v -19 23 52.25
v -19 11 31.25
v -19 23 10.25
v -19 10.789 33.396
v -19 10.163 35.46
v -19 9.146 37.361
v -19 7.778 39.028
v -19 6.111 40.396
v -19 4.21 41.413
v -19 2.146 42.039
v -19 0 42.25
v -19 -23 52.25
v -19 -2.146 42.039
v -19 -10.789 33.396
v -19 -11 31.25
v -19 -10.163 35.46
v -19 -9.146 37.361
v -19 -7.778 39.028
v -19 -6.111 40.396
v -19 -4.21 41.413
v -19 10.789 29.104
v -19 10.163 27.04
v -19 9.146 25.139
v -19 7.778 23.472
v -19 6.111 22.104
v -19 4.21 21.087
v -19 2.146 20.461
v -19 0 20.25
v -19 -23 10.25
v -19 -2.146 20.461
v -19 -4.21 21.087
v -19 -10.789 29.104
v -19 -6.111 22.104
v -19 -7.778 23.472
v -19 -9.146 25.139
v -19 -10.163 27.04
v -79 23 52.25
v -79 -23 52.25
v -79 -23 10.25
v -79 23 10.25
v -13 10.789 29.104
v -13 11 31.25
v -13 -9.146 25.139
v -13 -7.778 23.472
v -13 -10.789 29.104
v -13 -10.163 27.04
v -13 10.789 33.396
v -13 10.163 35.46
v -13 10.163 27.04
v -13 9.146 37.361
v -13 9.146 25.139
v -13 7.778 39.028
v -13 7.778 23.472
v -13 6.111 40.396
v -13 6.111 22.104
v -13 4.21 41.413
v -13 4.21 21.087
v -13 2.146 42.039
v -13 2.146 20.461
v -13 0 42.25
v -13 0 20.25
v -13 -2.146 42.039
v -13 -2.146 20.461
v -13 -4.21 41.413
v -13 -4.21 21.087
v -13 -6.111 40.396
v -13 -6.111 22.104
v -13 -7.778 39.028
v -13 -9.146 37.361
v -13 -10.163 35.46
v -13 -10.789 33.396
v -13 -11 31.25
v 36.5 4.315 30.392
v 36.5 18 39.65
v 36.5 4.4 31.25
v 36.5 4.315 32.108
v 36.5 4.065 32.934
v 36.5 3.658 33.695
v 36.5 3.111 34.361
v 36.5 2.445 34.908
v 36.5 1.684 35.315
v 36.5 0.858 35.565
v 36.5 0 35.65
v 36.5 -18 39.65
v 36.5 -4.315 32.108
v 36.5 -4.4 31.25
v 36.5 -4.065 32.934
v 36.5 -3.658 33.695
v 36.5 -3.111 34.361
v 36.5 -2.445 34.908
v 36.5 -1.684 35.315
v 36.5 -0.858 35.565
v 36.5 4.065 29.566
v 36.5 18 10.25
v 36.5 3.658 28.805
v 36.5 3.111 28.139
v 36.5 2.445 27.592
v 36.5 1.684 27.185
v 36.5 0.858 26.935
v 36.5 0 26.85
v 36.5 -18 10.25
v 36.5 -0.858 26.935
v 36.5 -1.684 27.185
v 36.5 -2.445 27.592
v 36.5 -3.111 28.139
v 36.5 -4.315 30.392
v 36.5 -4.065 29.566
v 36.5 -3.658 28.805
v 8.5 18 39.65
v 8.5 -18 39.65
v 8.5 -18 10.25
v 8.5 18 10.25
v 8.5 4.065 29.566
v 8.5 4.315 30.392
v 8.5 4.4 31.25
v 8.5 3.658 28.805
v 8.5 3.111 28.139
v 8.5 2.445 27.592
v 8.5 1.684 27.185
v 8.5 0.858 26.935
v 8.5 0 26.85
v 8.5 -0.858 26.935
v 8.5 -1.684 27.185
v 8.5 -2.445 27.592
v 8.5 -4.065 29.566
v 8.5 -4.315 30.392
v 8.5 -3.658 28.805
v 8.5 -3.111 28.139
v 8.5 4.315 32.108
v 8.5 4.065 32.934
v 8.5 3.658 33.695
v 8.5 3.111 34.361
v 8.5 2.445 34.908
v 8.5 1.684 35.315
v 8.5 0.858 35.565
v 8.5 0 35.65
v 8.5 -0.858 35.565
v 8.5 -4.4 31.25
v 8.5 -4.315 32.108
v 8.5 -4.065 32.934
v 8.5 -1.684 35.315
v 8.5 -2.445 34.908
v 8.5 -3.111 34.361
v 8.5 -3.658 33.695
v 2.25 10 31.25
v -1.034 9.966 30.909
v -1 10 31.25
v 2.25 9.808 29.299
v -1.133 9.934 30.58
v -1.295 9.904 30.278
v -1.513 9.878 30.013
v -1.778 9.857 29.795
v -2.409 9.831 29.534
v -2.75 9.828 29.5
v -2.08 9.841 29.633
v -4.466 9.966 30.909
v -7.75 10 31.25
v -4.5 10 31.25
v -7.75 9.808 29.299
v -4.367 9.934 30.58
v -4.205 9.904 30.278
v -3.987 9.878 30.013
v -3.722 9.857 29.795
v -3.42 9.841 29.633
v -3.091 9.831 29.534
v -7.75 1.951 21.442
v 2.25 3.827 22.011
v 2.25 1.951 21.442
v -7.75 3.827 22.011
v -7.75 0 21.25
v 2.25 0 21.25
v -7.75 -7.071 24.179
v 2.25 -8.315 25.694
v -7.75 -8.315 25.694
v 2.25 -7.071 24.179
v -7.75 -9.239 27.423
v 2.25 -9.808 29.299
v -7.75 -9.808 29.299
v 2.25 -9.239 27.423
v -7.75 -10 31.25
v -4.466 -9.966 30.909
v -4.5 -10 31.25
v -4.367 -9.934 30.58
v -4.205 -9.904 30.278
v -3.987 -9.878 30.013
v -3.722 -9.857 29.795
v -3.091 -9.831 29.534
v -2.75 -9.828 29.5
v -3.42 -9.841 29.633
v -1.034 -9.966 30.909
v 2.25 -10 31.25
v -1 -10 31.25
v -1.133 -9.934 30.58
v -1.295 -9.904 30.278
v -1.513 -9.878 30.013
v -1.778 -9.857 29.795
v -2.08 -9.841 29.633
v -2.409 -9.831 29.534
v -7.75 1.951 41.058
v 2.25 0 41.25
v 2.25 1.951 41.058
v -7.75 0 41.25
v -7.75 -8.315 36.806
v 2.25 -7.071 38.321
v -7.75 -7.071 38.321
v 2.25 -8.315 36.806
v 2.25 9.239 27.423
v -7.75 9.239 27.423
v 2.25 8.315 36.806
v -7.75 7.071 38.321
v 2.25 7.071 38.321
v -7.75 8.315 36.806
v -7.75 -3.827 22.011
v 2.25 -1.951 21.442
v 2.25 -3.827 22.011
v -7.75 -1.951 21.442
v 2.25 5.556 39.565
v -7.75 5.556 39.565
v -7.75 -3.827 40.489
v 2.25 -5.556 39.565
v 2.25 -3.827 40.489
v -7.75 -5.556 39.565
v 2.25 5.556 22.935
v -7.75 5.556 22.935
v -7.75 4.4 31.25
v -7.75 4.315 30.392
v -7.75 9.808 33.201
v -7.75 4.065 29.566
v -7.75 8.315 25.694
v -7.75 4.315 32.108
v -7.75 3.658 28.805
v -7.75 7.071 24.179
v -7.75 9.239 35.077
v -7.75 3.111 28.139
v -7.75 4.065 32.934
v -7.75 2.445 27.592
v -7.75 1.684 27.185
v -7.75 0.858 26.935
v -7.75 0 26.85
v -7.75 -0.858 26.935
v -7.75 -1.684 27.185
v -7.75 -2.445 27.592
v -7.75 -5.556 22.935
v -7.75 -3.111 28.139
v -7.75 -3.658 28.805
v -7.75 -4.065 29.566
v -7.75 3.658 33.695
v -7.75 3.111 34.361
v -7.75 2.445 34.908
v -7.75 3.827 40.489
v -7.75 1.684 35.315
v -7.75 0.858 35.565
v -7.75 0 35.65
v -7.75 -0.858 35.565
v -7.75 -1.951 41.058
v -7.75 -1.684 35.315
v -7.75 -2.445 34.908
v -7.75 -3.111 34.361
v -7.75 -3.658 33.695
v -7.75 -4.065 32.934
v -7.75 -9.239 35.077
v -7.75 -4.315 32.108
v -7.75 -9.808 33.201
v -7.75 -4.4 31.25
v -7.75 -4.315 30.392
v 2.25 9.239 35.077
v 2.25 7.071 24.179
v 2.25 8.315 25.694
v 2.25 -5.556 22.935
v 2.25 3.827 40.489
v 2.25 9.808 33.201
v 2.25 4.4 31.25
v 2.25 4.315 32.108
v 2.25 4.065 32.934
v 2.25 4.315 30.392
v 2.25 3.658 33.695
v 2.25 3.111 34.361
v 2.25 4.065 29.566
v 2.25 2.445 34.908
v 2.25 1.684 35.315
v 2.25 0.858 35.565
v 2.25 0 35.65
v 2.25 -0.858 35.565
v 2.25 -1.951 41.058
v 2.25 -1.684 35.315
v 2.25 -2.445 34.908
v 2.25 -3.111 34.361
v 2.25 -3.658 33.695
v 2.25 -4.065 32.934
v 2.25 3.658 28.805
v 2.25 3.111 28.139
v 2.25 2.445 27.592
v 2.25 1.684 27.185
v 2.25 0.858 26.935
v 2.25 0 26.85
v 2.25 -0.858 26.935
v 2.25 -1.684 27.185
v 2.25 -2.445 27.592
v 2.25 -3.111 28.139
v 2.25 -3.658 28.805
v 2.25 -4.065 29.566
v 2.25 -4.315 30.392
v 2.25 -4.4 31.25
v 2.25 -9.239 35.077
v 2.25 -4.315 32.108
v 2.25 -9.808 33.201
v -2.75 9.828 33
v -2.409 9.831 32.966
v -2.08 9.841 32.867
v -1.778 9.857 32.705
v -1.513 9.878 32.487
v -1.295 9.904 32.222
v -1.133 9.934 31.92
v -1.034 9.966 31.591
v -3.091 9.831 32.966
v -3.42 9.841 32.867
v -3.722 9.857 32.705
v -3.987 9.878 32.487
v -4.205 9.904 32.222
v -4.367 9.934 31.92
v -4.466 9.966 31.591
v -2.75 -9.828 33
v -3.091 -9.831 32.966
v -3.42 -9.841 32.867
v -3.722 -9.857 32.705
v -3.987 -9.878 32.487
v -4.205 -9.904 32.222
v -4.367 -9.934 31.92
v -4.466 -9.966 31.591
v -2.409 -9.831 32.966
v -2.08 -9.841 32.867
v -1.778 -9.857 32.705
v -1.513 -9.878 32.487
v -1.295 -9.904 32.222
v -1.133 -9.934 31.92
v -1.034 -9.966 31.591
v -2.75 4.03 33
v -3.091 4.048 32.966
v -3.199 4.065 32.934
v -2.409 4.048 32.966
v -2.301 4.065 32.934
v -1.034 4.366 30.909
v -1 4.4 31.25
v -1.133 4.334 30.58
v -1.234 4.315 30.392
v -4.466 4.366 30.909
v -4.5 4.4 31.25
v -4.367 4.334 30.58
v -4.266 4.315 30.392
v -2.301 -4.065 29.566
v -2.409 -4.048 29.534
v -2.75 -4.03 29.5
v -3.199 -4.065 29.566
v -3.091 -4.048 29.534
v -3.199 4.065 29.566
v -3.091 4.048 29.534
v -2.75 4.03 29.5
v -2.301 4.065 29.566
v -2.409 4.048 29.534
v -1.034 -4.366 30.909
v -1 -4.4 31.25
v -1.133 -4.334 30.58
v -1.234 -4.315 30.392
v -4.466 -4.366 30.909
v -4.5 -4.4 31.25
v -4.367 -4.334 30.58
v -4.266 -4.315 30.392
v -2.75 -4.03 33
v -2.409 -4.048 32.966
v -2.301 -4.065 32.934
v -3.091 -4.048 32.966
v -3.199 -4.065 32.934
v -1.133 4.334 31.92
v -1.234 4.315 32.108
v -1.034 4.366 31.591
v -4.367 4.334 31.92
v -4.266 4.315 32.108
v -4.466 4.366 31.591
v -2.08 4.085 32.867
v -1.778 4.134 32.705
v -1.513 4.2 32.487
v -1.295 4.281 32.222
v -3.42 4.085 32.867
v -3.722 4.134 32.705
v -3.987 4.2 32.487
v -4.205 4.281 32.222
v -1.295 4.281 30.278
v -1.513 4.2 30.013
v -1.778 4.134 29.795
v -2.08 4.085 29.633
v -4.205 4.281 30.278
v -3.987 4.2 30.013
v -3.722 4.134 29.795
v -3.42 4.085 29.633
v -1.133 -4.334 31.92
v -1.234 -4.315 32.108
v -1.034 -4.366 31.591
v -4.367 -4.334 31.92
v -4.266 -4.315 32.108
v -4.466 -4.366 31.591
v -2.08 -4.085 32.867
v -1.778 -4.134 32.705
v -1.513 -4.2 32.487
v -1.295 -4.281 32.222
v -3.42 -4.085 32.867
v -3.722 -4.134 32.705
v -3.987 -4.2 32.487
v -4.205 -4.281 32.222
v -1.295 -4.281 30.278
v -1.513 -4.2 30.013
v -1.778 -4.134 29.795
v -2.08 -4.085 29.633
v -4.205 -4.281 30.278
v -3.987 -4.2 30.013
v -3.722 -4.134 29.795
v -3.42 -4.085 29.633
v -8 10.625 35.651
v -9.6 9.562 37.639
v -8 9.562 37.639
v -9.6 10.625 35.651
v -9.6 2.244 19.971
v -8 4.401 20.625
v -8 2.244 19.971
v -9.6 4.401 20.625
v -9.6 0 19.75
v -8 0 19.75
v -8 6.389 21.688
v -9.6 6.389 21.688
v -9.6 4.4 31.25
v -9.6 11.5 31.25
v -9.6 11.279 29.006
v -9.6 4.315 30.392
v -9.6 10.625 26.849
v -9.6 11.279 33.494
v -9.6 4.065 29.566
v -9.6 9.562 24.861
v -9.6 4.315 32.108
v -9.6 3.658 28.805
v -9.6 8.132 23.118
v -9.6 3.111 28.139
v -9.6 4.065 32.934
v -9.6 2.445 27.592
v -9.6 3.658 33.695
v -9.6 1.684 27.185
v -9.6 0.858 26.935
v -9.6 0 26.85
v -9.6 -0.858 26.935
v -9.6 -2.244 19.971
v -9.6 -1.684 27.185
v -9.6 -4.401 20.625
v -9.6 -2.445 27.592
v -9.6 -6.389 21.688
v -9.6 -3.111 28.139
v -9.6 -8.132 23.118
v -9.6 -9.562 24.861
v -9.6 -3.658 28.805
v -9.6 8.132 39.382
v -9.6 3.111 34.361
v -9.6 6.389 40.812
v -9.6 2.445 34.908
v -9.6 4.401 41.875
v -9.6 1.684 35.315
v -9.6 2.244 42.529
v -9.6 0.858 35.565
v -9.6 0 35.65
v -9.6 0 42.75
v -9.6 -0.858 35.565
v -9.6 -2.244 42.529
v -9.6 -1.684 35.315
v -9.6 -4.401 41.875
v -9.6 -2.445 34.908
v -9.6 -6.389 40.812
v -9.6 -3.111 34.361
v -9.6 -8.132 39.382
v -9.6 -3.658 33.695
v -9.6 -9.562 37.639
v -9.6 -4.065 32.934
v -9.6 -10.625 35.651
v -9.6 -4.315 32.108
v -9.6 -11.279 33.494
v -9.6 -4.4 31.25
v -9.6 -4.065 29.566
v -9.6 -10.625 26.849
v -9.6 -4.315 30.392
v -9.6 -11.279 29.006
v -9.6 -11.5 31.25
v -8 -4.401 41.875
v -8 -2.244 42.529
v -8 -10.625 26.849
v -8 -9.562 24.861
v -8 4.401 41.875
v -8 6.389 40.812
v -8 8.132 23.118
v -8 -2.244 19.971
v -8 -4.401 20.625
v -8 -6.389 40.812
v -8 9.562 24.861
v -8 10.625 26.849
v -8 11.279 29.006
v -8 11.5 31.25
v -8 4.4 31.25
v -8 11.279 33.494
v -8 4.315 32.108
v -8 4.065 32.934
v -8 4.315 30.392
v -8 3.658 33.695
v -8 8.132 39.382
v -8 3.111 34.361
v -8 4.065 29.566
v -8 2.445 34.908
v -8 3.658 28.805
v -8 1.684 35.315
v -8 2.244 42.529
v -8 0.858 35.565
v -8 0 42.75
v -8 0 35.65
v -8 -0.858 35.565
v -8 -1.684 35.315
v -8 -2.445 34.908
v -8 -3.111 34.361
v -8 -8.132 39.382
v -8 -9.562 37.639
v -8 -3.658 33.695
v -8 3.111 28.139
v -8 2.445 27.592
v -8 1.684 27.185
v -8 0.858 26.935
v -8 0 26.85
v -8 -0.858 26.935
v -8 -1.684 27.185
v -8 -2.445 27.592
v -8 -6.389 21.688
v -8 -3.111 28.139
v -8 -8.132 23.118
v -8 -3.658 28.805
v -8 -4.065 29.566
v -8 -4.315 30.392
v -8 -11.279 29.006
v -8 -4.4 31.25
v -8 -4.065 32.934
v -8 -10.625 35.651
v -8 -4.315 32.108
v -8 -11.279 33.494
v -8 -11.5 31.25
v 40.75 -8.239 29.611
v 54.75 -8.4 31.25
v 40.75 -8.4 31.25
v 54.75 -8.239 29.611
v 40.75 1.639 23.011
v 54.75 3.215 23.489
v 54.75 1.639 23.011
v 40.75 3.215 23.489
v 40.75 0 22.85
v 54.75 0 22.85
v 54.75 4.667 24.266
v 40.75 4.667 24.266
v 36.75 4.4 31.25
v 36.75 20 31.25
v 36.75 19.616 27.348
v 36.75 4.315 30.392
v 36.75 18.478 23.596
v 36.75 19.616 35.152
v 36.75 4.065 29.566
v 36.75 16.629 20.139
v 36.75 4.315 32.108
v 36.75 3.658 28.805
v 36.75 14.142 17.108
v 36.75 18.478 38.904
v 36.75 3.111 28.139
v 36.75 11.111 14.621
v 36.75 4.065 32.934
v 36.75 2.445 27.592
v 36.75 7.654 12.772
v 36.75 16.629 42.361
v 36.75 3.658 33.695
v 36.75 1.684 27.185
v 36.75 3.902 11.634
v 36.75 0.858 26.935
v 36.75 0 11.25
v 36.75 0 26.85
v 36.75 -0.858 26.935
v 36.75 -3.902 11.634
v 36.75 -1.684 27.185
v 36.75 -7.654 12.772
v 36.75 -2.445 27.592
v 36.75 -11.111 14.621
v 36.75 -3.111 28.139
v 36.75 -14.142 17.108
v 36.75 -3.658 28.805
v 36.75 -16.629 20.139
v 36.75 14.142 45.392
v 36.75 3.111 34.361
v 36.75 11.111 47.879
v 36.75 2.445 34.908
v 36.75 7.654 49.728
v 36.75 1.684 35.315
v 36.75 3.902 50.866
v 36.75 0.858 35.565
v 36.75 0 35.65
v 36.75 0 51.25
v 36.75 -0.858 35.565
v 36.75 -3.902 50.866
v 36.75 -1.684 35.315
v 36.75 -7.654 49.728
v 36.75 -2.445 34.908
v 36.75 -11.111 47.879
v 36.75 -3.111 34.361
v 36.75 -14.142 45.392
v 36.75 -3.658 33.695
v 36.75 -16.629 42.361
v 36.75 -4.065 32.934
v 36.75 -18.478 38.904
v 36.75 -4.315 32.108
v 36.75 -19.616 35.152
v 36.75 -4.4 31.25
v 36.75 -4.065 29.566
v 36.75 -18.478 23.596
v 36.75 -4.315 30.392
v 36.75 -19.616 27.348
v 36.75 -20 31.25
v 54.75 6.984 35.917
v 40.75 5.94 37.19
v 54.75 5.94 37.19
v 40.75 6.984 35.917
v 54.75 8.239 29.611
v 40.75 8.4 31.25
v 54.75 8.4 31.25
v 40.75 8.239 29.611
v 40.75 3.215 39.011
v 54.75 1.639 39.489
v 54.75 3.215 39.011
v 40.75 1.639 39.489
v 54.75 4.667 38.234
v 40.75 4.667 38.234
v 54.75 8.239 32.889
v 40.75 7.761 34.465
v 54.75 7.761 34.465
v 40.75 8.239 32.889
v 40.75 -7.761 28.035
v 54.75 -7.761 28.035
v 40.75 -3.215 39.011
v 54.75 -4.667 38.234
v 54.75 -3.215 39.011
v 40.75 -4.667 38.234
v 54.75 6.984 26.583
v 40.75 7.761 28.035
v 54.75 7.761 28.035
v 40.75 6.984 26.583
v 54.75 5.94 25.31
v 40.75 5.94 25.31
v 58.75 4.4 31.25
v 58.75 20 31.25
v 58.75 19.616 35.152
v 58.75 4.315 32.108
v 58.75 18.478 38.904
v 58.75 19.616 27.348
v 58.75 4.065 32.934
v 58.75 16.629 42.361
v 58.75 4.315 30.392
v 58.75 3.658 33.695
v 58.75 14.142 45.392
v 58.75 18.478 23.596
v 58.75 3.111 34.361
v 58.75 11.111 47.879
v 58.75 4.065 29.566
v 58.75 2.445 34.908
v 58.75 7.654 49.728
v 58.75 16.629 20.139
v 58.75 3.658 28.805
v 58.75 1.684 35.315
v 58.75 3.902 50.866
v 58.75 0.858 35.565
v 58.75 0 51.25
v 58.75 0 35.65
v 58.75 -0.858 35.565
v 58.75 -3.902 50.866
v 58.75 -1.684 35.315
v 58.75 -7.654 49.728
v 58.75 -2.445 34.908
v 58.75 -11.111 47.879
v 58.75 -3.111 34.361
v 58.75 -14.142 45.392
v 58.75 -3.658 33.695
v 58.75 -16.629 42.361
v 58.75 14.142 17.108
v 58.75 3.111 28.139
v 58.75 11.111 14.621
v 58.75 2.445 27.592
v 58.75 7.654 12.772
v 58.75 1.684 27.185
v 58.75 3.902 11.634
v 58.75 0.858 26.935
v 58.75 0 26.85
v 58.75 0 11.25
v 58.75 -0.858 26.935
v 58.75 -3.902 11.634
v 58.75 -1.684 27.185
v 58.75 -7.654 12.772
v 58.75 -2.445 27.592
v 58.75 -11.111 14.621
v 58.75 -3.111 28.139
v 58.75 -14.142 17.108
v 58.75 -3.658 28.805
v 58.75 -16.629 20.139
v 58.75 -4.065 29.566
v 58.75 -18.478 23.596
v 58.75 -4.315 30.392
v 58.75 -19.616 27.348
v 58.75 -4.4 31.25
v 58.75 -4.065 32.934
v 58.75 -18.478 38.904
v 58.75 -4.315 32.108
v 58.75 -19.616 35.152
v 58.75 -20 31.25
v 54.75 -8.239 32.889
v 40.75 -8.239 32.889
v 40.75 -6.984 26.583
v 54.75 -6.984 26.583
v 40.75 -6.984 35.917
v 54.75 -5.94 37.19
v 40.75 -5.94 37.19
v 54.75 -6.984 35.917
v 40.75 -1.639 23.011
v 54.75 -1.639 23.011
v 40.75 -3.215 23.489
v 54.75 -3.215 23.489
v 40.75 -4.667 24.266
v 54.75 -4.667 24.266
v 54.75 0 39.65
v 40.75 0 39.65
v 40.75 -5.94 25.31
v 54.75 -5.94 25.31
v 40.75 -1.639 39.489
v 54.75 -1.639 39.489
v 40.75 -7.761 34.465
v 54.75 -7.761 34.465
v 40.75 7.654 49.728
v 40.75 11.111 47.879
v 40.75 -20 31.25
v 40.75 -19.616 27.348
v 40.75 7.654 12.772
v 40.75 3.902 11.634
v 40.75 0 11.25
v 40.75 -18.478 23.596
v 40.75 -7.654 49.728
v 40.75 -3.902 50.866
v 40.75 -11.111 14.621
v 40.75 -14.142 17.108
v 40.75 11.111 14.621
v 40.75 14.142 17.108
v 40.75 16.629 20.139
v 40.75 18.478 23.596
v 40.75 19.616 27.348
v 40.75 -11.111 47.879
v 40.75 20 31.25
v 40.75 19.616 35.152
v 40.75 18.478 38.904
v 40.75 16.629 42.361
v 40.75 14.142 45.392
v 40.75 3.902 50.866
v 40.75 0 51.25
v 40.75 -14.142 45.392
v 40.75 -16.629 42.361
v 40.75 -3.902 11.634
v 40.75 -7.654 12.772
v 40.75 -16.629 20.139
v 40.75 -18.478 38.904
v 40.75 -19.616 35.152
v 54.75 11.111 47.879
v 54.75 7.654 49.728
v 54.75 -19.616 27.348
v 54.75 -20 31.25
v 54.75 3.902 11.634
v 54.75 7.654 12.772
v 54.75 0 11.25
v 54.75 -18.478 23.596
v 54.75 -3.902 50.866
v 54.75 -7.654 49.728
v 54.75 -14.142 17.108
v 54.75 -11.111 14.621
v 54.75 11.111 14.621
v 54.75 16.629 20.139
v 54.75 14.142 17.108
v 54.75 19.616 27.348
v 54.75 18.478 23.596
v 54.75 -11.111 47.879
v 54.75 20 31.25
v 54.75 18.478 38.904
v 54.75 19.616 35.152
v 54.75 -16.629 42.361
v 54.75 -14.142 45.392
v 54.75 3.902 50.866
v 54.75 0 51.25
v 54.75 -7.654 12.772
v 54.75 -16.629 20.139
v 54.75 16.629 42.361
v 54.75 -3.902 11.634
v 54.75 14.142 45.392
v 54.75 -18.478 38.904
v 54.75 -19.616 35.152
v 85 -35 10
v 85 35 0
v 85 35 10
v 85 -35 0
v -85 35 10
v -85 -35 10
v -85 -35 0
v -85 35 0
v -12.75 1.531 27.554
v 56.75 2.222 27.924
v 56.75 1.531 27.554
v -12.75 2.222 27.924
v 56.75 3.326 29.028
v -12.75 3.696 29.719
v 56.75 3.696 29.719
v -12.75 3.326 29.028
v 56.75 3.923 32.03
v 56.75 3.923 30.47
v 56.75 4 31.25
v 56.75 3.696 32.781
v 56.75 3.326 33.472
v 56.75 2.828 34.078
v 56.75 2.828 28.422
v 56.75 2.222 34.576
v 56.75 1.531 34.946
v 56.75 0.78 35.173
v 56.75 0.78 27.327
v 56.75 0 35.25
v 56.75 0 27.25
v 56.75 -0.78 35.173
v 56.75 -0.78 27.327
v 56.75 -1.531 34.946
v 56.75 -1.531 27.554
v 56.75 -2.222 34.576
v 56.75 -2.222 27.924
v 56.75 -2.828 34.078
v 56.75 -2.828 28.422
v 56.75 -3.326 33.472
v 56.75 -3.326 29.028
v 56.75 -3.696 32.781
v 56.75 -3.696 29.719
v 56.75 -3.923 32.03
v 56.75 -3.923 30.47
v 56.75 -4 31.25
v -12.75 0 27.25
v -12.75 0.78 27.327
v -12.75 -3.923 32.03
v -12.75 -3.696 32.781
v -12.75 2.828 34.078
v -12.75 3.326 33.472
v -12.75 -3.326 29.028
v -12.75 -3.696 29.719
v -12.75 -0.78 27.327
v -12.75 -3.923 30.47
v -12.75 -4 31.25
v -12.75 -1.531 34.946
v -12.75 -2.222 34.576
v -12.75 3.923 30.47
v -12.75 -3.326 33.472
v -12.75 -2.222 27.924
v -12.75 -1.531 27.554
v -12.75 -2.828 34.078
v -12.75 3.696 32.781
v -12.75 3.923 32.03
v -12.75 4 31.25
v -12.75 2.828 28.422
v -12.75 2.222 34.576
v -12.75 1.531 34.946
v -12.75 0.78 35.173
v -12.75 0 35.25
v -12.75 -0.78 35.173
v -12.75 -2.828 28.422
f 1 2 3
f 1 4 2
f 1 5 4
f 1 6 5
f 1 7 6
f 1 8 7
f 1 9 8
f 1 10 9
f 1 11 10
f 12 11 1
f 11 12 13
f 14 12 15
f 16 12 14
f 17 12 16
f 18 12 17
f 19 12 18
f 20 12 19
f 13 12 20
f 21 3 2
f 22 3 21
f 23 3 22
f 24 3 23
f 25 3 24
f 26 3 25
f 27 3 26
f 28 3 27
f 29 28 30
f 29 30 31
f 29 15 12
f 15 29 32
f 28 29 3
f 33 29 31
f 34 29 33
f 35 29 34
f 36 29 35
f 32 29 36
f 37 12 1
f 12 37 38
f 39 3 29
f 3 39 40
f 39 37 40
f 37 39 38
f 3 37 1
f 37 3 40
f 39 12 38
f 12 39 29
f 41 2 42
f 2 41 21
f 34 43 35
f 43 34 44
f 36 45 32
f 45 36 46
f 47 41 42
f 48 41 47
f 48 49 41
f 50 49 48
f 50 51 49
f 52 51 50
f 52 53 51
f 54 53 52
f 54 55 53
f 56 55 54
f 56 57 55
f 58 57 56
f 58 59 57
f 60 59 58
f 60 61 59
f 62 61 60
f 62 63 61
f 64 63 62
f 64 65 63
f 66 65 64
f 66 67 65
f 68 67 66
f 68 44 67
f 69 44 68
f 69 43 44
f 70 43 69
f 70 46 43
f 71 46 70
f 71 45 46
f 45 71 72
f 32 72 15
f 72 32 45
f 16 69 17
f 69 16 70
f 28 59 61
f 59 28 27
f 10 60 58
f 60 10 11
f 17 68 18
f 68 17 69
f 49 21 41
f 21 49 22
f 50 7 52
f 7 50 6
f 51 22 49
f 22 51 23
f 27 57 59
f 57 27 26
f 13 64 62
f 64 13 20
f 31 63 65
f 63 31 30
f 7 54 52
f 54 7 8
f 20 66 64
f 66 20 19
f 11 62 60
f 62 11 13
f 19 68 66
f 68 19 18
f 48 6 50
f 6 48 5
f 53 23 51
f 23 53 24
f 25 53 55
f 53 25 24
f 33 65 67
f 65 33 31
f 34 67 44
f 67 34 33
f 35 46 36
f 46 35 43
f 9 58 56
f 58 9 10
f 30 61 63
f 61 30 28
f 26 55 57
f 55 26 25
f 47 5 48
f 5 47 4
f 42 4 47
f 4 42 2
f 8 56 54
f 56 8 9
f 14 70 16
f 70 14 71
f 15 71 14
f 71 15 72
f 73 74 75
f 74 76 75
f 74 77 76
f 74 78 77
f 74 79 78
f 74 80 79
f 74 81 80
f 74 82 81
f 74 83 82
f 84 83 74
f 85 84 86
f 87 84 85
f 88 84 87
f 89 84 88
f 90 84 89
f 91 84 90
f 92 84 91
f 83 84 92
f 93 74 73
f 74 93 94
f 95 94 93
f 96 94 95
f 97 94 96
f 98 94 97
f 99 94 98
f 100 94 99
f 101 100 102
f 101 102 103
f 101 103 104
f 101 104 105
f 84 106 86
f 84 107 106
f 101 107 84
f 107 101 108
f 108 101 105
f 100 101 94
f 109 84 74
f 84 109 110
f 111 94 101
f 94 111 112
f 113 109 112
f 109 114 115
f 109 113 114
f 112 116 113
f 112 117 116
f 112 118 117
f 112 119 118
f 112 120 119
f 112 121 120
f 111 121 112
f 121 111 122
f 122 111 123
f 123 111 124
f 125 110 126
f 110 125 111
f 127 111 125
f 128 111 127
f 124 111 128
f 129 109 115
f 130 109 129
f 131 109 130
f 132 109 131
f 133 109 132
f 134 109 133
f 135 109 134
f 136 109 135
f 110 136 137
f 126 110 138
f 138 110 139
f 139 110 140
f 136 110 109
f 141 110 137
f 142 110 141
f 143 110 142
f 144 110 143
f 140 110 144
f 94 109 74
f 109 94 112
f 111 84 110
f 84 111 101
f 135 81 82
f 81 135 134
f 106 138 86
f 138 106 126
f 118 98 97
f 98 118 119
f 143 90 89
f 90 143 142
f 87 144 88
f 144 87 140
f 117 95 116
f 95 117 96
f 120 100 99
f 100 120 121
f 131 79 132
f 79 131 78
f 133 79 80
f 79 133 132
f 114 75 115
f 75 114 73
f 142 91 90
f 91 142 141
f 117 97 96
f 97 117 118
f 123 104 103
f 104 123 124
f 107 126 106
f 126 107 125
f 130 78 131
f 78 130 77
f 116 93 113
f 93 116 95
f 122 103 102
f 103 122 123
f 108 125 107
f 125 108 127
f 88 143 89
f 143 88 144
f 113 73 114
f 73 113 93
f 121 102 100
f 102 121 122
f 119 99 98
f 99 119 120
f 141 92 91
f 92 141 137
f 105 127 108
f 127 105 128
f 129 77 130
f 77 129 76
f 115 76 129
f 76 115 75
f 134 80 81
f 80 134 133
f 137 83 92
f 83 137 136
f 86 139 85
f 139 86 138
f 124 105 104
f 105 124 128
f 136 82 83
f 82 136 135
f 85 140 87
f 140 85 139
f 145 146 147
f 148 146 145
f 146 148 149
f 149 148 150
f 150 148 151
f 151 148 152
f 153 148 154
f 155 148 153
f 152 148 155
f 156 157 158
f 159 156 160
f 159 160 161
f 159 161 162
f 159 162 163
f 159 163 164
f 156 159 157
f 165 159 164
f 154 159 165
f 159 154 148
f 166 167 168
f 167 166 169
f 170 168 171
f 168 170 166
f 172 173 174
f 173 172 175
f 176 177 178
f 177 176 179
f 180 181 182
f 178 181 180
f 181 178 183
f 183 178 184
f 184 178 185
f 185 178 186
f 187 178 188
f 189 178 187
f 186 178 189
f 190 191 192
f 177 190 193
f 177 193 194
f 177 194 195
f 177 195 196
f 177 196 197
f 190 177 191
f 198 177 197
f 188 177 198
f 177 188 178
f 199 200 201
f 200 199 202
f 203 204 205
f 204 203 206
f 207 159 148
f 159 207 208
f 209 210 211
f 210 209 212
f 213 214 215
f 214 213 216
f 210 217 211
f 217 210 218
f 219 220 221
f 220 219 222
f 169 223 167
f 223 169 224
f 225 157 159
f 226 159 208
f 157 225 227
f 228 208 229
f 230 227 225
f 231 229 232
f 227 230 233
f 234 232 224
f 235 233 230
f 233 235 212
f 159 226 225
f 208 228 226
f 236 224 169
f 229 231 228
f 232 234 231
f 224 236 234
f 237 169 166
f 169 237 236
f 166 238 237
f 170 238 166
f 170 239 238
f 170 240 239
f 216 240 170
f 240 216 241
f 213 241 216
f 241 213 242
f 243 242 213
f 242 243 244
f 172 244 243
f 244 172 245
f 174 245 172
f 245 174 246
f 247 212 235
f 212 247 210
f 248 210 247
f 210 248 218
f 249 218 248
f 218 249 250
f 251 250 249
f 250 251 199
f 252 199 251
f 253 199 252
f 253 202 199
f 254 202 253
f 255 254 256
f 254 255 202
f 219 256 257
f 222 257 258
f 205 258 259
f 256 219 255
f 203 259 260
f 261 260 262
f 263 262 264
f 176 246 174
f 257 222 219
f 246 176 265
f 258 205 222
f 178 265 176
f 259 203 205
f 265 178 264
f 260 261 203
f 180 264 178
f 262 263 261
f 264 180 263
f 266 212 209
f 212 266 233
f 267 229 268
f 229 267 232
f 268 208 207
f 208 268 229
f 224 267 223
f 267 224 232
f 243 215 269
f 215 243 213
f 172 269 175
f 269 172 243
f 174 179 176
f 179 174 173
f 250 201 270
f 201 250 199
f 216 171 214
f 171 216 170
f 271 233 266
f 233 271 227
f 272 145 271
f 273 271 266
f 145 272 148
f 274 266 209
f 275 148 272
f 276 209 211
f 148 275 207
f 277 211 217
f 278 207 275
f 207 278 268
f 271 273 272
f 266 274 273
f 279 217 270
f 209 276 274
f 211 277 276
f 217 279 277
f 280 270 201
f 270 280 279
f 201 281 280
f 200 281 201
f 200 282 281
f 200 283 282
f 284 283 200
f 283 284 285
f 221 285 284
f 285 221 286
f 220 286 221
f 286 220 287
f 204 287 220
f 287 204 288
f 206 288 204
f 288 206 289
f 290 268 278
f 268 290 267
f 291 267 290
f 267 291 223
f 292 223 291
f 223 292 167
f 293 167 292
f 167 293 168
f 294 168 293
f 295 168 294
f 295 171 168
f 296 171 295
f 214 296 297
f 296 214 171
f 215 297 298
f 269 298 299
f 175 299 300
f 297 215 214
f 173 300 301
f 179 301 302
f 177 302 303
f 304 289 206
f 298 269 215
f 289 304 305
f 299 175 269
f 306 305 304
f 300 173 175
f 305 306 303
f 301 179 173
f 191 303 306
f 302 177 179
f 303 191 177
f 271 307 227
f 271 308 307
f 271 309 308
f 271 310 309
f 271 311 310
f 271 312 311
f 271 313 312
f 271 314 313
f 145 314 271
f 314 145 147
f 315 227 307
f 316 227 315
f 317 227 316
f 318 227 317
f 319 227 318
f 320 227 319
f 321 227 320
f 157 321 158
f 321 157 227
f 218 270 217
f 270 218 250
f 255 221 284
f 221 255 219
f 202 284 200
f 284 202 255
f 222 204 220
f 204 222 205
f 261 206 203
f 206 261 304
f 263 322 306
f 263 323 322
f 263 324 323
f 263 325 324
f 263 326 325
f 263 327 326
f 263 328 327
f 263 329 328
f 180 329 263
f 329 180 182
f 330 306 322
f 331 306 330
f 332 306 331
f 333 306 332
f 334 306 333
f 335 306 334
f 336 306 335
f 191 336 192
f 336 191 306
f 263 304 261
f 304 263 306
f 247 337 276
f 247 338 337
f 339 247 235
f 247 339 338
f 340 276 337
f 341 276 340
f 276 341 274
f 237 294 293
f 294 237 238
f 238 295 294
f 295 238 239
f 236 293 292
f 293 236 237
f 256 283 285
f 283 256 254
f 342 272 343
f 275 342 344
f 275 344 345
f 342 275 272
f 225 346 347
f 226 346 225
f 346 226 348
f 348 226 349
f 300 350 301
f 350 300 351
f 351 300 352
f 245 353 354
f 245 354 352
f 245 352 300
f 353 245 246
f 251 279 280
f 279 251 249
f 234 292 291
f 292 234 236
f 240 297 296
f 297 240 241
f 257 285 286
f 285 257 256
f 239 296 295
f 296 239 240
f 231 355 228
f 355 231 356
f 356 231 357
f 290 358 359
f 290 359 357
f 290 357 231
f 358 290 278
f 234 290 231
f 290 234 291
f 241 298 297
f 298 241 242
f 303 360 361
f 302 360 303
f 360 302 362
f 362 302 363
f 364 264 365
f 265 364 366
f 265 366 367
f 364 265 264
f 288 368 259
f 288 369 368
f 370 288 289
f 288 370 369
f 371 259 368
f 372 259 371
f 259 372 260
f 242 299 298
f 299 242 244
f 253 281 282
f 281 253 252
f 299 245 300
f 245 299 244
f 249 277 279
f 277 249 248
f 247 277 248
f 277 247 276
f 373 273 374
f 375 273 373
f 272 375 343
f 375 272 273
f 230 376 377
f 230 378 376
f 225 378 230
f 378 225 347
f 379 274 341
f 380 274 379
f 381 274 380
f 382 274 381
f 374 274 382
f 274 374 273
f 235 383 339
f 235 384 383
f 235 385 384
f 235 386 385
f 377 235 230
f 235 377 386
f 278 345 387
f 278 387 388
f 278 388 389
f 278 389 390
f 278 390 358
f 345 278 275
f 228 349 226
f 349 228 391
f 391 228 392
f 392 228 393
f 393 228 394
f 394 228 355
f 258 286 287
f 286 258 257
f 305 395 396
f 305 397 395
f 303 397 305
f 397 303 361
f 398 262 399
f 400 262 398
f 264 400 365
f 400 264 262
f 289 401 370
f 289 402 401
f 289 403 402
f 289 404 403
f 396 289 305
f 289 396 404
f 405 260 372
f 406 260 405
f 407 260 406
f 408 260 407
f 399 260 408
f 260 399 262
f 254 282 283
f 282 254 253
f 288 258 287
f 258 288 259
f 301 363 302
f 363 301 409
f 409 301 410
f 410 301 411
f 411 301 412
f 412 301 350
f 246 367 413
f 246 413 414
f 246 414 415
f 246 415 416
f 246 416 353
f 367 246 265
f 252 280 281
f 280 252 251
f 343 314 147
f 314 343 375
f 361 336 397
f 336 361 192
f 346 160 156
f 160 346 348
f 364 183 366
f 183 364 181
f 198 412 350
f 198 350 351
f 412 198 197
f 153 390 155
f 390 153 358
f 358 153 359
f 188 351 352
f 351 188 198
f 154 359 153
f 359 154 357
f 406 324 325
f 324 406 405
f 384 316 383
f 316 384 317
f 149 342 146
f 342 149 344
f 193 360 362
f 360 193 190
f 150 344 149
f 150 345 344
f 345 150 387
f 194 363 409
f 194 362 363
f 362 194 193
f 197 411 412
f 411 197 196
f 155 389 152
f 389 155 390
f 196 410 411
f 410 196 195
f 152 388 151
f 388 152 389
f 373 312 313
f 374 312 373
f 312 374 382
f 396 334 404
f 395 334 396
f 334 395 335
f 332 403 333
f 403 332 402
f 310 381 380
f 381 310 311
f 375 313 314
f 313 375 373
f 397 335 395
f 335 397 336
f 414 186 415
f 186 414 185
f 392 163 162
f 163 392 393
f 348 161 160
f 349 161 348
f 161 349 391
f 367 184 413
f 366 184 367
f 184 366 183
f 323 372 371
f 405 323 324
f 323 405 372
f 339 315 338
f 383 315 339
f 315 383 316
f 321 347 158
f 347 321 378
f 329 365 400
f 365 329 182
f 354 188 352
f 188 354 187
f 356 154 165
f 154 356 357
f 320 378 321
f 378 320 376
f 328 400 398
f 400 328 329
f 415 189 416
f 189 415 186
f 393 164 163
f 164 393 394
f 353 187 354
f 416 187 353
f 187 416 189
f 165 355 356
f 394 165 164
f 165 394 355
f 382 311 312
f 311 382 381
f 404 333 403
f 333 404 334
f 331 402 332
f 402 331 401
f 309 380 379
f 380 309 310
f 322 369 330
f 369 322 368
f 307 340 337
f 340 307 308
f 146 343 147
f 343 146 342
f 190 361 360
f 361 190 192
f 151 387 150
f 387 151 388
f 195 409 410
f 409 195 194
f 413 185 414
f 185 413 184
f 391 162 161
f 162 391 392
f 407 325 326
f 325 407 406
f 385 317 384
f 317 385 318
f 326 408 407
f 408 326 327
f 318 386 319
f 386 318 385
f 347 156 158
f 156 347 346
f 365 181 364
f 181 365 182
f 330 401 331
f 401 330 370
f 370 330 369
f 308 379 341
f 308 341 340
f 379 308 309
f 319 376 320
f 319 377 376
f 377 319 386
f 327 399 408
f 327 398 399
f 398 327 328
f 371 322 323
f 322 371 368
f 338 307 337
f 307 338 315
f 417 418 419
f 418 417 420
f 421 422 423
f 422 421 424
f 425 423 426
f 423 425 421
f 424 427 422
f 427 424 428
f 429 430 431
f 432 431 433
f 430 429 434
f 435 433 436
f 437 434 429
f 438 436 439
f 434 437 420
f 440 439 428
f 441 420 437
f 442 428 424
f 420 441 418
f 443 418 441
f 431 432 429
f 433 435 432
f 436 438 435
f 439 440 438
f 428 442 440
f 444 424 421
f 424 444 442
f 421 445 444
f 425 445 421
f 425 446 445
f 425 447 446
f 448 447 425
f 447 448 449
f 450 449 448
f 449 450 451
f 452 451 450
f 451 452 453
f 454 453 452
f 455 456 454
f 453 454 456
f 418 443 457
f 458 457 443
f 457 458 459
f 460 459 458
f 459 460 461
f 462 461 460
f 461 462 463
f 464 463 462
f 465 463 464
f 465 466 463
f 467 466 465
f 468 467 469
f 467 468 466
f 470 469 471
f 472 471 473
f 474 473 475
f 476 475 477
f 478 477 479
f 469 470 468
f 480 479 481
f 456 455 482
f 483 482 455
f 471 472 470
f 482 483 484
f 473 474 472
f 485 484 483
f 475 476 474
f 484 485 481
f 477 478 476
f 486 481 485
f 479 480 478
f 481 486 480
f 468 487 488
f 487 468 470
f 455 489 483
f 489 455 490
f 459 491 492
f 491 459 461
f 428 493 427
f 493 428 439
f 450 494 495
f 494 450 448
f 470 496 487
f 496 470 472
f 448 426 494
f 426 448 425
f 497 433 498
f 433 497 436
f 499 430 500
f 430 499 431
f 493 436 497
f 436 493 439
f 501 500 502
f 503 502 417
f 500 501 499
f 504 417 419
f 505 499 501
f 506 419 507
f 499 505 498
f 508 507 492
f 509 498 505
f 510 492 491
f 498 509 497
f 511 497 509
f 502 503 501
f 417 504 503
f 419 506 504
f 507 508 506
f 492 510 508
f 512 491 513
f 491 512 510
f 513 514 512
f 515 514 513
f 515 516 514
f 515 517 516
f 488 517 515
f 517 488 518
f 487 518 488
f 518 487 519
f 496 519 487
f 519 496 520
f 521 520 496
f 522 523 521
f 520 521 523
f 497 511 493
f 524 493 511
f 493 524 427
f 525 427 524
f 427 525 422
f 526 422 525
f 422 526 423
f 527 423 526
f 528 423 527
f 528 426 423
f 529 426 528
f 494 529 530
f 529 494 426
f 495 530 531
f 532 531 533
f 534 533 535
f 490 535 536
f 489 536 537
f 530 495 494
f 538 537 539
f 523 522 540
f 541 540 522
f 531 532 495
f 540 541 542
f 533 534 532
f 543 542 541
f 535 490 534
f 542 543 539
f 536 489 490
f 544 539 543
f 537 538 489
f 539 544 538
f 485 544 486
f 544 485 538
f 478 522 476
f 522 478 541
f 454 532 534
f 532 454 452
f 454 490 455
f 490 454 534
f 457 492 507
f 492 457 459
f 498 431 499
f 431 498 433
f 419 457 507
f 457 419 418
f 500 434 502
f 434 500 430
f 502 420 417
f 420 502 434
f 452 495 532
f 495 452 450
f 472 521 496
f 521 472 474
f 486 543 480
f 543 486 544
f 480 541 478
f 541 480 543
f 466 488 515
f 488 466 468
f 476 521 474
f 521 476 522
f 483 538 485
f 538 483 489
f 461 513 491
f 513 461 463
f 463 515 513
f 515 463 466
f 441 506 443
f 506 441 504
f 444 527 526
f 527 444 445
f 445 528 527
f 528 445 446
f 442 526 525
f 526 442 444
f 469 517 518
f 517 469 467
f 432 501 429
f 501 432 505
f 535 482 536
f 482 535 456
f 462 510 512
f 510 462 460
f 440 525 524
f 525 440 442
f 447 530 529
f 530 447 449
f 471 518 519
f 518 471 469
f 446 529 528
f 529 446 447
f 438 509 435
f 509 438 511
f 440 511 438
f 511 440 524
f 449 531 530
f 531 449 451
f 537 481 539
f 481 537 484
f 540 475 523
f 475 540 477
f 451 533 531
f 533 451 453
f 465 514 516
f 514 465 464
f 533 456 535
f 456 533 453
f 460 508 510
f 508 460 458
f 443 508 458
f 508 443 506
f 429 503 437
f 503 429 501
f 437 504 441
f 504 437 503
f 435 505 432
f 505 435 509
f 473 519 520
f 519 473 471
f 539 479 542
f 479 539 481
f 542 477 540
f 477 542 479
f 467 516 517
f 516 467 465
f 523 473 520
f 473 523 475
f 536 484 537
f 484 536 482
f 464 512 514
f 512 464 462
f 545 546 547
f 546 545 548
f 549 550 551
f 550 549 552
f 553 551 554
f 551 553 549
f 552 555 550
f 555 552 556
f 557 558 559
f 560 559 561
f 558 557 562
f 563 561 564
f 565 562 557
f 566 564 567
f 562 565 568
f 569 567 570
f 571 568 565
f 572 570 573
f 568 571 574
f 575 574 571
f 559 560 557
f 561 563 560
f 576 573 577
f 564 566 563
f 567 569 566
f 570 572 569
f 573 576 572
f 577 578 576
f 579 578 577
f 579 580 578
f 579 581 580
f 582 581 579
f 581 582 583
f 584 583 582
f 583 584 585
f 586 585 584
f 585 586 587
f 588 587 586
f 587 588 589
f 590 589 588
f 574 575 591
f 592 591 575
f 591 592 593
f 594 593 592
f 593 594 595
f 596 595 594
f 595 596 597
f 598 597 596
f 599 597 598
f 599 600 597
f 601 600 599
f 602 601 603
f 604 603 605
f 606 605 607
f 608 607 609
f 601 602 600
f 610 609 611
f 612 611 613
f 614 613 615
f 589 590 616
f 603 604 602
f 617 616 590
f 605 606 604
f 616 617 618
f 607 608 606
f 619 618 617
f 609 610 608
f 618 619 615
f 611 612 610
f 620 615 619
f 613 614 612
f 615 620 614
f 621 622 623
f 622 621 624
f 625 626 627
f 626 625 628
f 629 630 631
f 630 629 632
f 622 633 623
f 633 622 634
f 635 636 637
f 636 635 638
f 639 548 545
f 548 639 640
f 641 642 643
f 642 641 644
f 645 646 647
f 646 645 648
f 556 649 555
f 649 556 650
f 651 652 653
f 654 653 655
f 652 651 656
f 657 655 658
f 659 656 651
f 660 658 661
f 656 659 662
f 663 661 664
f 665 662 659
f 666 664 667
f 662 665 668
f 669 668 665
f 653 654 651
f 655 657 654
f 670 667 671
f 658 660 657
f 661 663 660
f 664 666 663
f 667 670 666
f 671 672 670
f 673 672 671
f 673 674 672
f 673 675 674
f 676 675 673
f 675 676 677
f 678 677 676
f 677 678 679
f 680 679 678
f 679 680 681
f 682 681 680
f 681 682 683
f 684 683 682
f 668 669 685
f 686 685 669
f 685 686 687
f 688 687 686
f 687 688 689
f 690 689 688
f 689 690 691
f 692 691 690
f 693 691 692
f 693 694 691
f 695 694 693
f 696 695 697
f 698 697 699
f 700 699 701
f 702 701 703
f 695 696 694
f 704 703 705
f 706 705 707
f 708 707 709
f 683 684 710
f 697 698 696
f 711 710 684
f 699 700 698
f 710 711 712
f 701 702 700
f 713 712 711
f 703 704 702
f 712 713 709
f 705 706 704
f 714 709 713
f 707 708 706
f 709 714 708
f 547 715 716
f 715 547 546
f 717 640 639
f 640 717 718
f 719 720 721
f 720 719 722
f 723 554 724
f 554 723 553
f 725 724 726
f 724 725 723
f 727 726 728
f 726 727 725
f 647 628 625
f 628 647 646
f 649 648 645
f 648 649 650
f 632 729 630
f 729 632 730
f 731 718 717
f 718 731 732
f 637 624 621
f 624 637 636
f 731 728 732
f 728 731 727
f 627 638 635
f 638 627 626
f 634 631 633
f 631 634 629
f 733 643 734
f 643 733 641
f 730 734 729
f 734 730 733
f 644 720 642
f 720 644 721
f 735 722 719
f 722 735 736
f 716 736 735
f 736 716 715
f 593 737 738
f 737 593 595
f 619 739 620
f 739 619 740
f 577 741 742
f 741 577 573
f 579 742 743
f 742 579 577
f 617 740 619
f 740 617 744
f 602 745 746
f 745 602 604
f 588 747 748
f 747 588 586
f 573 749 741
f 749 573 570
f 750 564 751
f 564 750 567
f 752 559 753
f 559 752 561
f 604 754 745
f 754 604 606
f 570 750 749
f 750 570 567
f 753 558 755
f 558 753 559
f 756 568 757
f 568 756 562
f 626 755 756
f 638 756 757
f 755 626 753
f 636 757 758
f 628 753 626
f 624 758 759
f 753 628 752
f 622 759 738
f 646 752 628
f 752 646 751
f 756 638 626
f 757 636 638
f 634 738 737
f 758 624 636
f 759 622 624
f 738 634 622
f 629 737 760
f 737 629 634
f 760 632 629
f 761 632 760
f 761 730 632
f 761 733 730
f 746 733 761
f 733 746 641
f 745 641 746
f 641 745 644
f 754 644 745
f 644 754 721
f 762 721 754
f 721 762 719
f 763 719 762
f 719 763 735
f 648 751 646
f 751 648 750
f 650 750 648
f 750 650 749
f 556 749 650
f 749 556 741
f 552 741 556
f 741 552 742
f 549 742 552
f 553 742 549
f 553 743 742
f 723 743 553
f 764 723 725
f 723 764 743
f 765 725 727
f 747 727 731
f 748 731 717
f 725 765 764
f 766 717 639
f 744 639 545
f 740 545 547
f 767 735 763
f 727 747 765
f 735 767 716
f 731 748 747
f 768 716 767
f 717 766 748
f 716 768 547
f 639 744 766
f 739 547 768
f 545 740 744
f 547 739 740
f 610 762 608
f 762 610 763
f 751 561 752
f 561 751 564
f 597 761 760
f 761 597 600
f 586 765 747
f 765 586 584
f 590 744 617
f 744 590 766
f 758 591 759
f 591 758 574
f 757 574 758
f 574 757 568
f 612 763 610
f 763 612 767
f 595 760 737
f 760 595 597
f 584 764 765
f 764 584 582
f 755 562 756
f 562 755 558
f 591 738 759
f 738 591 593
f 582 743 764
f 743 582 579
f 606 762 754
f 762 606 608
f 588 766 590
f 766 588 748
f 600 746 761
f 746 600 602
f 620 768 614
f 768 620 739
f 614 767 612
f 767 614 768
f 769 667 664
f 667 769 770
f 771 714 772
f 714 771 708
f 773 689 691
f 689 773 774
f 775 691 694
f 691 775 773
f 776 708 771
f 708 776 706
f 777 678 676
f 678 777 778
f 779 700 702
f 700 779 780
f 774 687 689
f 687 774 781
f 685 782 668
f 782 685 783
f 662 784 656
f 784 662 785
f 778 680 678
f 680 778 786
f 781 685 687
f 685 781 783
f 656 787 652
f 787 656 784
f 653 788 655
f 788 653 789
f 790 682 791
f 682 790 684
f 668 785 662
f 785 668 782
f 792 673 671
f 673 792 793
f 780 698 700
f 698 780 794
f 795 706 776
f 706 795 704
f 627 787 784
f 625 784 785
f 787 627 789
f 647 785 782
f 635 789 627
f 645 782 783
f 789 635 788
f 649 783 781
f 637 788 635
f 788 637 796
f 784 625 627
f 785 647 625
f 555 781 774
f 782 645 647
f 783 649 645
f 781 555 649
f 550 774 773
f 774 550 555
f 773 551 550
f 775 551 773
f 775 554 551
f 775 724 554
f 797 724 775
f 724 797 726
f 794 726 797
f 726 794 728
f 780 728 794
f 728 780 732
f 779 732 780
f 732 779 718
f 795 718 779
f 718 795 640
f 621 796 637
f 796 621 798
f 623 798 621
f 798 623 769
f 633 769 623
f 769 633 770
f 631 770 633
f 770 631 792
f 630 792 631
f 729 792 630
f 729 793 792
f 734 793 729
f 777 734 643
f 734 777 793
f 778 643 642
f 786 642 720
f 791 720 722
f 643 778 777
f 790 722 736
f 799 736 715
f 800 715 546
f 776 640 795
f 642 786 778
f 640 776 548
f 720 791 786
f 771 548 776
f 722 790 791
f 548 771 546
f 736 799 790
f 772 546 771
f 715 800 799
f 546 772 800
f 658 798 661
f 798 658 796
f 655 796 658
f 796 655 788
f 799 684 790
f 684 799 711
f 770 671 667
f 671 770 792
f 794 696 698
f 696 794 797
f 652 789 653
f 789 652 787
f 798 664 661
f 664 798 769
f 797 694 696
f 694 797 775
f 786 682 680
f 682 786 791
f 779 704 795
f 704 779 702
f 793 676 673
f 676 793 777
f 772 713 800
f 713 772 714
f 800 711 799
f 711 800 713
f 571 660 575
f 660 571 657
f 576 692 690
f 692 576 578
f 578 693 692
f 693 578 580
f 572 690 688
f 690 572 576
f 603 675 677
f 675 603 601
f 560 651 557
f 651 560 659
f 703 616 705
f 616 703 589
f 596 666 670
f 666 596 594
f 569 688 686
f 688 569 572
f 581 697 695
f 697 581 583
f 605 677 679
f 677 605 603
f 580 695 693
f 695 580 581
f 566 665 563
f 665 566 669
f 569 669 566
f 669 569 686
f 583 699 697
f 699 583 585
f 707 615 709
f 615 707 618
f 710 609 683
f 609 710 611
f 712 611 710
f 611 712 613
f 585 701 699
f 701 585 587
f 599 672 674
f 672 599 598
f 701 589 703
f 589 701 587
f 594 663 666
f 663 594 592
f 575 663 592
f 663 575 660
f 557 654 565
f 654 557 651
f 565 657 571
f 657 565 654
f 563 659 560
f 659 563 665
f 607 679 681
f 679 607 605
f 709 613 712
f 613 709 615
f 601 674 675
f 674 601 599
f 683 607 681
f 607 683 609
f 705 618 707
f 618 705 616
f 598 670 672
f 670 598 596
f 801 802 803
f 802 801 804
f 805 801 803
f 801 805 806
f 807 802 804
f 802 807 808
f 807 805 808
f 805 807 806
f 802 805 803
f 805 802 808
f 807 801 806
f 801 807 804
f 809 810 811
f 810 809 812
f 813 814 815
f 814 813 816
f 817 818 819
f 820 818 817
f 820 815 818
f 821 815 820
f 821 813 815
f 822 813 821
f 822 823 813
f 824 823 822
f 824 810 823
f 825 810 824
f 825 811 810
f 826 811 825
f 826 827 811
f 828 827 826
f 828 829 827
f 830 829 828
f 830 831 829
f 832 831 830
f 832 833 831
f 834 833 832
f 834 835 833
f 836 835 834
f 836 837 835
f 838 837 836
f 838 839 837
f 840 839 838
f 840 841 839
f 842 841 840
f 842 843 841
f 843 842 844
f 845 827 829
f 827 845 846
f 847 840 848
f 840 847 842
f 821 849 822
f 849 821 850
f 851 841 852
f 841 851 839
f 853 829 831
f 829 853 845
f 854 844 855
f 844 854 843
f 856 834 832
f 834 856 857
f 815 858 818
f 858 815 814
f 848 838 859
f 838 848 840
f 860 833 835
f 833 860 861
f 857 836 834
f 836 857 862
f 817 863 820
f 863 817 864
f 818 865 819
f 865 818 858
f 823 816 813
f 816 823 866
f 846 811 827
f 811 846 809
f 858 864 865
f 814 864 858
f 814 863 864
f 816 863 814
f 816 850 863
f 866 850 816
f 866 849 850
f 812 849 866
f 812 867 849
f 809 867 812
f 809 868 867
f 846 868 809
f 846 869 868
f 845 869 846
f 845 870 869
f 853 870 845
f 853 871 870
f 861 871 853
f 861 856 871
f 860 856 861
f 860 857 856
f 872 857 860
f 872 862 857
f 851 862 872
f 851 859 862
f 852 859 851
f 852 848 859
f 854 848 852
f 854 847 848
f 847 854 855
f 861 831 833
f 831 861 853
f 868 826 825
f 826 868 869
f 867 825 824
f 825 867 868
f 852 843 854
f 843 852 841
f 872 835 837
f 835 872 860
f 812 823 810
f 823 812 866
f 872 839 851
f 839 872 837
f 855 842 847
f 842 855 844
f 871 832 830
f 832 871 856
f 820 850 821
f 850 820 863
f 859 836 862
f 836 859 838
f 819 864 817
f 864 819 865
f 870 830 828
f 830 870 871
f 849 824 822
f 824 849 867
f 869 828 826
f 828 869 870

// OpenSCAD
$fn = 32;

// ------------------------------------------------------------------------
// Motor drive station: motor 60 x 42 mm, shaft d8, pulley d40
// Every part is its own module, assembly() places every instance.
// ------------------------------------------------------------------------

// --- part 1 ---
module station_bed() {
  difference() {
    translate([-85, -35, 0]) cube([170, 70, 10]);
  }
}

// --- part 2 ---
module drive_motor() {
  union() {
    translate([-30, -23, 0]) cube([60, 46, 42]);
    translate([33, 0, 21]) rotate([0, 90, 0]) cylinder(h = 6, d = 22, center = true);
  }
}

// --- part 3 ---
module pillow_block() {
  difference() {
    translate([-14, -18, 0]) cube([28, 36, 29.4]);
    translate([0, 0, 21]) rotate([0, 90, 0]) cylinder(h = 30, d = 8.8, center = true);
  }
}

// --- part 4 ---
module drive_shaft() {
  translate([0, 0, -34.75]) cylinder(h = 69.5, d = 8);
}

// --- part 5 ---
module shaft_collar() {
  difference() {
    cylinder(h = 10, d = 20);
    translate([0, 0, -1]) cylinder(h = 12, d = 8.8);
    translate([0, 0, 5]) rotate([90, 0, 0]) cylinder(h = 22, d = 3.5, center = true);
  }
}

// --- part 6 ---
module collar_washer() {
  difference() {
      translate([0, 0, 0]) cylinder(h = 1.6, d = 23);
      translate([0, 0, -1]) cylinder(h = 3.6, d = 8.8);
    }
}

// --- part 7 ---
module drive_pulley() {
  difference() {
    union() {
      cylinder(h = 22, d = 16.8);
      cylinder(h = 4, d = 40);
      translate([0, 0, 18]) cylinder(h = 4, d = 40);
    }
    translate([0, 0, -1]) cylinder(h = 24, d = 8.8);
  }
}

// --- assembly ---
module assembly() {
  color([0.80, 0.24, 0.20]) translate([0, 0, 0]) rotate([0, 0, 0]) station_bed();
  color([0.20, 0.45, 0.75]) translate([-49, 0, 10.25]) rotate([0, 0, 0]) drive_motor();
  color([0.25, 0.62, 0.32]) translate([22.5, 0, 10.25]) rotate([0, 0, 0]) pillow_block();
  color([0.92, 0.70, 0.18]) translate([22, 0, 31.25]) rotate([0, 90, 0]) drive_shaft();
  color([0.58, 0.35, 0.70]) translate([-7.75, 0, 31.25]) rotate([0, 90, 0]) shaft_collar();
  color([0.16, 0.66, 0.66]) translate([-9.6, 0, 31.25]) rotate([0, 90, 0]) collar_washer();
  color([0.85, 0.48, 0.18]) translate([36.75, 0, 31.25]) rotate([0, 90, 0]) drive_pulley();
}

assembly();
